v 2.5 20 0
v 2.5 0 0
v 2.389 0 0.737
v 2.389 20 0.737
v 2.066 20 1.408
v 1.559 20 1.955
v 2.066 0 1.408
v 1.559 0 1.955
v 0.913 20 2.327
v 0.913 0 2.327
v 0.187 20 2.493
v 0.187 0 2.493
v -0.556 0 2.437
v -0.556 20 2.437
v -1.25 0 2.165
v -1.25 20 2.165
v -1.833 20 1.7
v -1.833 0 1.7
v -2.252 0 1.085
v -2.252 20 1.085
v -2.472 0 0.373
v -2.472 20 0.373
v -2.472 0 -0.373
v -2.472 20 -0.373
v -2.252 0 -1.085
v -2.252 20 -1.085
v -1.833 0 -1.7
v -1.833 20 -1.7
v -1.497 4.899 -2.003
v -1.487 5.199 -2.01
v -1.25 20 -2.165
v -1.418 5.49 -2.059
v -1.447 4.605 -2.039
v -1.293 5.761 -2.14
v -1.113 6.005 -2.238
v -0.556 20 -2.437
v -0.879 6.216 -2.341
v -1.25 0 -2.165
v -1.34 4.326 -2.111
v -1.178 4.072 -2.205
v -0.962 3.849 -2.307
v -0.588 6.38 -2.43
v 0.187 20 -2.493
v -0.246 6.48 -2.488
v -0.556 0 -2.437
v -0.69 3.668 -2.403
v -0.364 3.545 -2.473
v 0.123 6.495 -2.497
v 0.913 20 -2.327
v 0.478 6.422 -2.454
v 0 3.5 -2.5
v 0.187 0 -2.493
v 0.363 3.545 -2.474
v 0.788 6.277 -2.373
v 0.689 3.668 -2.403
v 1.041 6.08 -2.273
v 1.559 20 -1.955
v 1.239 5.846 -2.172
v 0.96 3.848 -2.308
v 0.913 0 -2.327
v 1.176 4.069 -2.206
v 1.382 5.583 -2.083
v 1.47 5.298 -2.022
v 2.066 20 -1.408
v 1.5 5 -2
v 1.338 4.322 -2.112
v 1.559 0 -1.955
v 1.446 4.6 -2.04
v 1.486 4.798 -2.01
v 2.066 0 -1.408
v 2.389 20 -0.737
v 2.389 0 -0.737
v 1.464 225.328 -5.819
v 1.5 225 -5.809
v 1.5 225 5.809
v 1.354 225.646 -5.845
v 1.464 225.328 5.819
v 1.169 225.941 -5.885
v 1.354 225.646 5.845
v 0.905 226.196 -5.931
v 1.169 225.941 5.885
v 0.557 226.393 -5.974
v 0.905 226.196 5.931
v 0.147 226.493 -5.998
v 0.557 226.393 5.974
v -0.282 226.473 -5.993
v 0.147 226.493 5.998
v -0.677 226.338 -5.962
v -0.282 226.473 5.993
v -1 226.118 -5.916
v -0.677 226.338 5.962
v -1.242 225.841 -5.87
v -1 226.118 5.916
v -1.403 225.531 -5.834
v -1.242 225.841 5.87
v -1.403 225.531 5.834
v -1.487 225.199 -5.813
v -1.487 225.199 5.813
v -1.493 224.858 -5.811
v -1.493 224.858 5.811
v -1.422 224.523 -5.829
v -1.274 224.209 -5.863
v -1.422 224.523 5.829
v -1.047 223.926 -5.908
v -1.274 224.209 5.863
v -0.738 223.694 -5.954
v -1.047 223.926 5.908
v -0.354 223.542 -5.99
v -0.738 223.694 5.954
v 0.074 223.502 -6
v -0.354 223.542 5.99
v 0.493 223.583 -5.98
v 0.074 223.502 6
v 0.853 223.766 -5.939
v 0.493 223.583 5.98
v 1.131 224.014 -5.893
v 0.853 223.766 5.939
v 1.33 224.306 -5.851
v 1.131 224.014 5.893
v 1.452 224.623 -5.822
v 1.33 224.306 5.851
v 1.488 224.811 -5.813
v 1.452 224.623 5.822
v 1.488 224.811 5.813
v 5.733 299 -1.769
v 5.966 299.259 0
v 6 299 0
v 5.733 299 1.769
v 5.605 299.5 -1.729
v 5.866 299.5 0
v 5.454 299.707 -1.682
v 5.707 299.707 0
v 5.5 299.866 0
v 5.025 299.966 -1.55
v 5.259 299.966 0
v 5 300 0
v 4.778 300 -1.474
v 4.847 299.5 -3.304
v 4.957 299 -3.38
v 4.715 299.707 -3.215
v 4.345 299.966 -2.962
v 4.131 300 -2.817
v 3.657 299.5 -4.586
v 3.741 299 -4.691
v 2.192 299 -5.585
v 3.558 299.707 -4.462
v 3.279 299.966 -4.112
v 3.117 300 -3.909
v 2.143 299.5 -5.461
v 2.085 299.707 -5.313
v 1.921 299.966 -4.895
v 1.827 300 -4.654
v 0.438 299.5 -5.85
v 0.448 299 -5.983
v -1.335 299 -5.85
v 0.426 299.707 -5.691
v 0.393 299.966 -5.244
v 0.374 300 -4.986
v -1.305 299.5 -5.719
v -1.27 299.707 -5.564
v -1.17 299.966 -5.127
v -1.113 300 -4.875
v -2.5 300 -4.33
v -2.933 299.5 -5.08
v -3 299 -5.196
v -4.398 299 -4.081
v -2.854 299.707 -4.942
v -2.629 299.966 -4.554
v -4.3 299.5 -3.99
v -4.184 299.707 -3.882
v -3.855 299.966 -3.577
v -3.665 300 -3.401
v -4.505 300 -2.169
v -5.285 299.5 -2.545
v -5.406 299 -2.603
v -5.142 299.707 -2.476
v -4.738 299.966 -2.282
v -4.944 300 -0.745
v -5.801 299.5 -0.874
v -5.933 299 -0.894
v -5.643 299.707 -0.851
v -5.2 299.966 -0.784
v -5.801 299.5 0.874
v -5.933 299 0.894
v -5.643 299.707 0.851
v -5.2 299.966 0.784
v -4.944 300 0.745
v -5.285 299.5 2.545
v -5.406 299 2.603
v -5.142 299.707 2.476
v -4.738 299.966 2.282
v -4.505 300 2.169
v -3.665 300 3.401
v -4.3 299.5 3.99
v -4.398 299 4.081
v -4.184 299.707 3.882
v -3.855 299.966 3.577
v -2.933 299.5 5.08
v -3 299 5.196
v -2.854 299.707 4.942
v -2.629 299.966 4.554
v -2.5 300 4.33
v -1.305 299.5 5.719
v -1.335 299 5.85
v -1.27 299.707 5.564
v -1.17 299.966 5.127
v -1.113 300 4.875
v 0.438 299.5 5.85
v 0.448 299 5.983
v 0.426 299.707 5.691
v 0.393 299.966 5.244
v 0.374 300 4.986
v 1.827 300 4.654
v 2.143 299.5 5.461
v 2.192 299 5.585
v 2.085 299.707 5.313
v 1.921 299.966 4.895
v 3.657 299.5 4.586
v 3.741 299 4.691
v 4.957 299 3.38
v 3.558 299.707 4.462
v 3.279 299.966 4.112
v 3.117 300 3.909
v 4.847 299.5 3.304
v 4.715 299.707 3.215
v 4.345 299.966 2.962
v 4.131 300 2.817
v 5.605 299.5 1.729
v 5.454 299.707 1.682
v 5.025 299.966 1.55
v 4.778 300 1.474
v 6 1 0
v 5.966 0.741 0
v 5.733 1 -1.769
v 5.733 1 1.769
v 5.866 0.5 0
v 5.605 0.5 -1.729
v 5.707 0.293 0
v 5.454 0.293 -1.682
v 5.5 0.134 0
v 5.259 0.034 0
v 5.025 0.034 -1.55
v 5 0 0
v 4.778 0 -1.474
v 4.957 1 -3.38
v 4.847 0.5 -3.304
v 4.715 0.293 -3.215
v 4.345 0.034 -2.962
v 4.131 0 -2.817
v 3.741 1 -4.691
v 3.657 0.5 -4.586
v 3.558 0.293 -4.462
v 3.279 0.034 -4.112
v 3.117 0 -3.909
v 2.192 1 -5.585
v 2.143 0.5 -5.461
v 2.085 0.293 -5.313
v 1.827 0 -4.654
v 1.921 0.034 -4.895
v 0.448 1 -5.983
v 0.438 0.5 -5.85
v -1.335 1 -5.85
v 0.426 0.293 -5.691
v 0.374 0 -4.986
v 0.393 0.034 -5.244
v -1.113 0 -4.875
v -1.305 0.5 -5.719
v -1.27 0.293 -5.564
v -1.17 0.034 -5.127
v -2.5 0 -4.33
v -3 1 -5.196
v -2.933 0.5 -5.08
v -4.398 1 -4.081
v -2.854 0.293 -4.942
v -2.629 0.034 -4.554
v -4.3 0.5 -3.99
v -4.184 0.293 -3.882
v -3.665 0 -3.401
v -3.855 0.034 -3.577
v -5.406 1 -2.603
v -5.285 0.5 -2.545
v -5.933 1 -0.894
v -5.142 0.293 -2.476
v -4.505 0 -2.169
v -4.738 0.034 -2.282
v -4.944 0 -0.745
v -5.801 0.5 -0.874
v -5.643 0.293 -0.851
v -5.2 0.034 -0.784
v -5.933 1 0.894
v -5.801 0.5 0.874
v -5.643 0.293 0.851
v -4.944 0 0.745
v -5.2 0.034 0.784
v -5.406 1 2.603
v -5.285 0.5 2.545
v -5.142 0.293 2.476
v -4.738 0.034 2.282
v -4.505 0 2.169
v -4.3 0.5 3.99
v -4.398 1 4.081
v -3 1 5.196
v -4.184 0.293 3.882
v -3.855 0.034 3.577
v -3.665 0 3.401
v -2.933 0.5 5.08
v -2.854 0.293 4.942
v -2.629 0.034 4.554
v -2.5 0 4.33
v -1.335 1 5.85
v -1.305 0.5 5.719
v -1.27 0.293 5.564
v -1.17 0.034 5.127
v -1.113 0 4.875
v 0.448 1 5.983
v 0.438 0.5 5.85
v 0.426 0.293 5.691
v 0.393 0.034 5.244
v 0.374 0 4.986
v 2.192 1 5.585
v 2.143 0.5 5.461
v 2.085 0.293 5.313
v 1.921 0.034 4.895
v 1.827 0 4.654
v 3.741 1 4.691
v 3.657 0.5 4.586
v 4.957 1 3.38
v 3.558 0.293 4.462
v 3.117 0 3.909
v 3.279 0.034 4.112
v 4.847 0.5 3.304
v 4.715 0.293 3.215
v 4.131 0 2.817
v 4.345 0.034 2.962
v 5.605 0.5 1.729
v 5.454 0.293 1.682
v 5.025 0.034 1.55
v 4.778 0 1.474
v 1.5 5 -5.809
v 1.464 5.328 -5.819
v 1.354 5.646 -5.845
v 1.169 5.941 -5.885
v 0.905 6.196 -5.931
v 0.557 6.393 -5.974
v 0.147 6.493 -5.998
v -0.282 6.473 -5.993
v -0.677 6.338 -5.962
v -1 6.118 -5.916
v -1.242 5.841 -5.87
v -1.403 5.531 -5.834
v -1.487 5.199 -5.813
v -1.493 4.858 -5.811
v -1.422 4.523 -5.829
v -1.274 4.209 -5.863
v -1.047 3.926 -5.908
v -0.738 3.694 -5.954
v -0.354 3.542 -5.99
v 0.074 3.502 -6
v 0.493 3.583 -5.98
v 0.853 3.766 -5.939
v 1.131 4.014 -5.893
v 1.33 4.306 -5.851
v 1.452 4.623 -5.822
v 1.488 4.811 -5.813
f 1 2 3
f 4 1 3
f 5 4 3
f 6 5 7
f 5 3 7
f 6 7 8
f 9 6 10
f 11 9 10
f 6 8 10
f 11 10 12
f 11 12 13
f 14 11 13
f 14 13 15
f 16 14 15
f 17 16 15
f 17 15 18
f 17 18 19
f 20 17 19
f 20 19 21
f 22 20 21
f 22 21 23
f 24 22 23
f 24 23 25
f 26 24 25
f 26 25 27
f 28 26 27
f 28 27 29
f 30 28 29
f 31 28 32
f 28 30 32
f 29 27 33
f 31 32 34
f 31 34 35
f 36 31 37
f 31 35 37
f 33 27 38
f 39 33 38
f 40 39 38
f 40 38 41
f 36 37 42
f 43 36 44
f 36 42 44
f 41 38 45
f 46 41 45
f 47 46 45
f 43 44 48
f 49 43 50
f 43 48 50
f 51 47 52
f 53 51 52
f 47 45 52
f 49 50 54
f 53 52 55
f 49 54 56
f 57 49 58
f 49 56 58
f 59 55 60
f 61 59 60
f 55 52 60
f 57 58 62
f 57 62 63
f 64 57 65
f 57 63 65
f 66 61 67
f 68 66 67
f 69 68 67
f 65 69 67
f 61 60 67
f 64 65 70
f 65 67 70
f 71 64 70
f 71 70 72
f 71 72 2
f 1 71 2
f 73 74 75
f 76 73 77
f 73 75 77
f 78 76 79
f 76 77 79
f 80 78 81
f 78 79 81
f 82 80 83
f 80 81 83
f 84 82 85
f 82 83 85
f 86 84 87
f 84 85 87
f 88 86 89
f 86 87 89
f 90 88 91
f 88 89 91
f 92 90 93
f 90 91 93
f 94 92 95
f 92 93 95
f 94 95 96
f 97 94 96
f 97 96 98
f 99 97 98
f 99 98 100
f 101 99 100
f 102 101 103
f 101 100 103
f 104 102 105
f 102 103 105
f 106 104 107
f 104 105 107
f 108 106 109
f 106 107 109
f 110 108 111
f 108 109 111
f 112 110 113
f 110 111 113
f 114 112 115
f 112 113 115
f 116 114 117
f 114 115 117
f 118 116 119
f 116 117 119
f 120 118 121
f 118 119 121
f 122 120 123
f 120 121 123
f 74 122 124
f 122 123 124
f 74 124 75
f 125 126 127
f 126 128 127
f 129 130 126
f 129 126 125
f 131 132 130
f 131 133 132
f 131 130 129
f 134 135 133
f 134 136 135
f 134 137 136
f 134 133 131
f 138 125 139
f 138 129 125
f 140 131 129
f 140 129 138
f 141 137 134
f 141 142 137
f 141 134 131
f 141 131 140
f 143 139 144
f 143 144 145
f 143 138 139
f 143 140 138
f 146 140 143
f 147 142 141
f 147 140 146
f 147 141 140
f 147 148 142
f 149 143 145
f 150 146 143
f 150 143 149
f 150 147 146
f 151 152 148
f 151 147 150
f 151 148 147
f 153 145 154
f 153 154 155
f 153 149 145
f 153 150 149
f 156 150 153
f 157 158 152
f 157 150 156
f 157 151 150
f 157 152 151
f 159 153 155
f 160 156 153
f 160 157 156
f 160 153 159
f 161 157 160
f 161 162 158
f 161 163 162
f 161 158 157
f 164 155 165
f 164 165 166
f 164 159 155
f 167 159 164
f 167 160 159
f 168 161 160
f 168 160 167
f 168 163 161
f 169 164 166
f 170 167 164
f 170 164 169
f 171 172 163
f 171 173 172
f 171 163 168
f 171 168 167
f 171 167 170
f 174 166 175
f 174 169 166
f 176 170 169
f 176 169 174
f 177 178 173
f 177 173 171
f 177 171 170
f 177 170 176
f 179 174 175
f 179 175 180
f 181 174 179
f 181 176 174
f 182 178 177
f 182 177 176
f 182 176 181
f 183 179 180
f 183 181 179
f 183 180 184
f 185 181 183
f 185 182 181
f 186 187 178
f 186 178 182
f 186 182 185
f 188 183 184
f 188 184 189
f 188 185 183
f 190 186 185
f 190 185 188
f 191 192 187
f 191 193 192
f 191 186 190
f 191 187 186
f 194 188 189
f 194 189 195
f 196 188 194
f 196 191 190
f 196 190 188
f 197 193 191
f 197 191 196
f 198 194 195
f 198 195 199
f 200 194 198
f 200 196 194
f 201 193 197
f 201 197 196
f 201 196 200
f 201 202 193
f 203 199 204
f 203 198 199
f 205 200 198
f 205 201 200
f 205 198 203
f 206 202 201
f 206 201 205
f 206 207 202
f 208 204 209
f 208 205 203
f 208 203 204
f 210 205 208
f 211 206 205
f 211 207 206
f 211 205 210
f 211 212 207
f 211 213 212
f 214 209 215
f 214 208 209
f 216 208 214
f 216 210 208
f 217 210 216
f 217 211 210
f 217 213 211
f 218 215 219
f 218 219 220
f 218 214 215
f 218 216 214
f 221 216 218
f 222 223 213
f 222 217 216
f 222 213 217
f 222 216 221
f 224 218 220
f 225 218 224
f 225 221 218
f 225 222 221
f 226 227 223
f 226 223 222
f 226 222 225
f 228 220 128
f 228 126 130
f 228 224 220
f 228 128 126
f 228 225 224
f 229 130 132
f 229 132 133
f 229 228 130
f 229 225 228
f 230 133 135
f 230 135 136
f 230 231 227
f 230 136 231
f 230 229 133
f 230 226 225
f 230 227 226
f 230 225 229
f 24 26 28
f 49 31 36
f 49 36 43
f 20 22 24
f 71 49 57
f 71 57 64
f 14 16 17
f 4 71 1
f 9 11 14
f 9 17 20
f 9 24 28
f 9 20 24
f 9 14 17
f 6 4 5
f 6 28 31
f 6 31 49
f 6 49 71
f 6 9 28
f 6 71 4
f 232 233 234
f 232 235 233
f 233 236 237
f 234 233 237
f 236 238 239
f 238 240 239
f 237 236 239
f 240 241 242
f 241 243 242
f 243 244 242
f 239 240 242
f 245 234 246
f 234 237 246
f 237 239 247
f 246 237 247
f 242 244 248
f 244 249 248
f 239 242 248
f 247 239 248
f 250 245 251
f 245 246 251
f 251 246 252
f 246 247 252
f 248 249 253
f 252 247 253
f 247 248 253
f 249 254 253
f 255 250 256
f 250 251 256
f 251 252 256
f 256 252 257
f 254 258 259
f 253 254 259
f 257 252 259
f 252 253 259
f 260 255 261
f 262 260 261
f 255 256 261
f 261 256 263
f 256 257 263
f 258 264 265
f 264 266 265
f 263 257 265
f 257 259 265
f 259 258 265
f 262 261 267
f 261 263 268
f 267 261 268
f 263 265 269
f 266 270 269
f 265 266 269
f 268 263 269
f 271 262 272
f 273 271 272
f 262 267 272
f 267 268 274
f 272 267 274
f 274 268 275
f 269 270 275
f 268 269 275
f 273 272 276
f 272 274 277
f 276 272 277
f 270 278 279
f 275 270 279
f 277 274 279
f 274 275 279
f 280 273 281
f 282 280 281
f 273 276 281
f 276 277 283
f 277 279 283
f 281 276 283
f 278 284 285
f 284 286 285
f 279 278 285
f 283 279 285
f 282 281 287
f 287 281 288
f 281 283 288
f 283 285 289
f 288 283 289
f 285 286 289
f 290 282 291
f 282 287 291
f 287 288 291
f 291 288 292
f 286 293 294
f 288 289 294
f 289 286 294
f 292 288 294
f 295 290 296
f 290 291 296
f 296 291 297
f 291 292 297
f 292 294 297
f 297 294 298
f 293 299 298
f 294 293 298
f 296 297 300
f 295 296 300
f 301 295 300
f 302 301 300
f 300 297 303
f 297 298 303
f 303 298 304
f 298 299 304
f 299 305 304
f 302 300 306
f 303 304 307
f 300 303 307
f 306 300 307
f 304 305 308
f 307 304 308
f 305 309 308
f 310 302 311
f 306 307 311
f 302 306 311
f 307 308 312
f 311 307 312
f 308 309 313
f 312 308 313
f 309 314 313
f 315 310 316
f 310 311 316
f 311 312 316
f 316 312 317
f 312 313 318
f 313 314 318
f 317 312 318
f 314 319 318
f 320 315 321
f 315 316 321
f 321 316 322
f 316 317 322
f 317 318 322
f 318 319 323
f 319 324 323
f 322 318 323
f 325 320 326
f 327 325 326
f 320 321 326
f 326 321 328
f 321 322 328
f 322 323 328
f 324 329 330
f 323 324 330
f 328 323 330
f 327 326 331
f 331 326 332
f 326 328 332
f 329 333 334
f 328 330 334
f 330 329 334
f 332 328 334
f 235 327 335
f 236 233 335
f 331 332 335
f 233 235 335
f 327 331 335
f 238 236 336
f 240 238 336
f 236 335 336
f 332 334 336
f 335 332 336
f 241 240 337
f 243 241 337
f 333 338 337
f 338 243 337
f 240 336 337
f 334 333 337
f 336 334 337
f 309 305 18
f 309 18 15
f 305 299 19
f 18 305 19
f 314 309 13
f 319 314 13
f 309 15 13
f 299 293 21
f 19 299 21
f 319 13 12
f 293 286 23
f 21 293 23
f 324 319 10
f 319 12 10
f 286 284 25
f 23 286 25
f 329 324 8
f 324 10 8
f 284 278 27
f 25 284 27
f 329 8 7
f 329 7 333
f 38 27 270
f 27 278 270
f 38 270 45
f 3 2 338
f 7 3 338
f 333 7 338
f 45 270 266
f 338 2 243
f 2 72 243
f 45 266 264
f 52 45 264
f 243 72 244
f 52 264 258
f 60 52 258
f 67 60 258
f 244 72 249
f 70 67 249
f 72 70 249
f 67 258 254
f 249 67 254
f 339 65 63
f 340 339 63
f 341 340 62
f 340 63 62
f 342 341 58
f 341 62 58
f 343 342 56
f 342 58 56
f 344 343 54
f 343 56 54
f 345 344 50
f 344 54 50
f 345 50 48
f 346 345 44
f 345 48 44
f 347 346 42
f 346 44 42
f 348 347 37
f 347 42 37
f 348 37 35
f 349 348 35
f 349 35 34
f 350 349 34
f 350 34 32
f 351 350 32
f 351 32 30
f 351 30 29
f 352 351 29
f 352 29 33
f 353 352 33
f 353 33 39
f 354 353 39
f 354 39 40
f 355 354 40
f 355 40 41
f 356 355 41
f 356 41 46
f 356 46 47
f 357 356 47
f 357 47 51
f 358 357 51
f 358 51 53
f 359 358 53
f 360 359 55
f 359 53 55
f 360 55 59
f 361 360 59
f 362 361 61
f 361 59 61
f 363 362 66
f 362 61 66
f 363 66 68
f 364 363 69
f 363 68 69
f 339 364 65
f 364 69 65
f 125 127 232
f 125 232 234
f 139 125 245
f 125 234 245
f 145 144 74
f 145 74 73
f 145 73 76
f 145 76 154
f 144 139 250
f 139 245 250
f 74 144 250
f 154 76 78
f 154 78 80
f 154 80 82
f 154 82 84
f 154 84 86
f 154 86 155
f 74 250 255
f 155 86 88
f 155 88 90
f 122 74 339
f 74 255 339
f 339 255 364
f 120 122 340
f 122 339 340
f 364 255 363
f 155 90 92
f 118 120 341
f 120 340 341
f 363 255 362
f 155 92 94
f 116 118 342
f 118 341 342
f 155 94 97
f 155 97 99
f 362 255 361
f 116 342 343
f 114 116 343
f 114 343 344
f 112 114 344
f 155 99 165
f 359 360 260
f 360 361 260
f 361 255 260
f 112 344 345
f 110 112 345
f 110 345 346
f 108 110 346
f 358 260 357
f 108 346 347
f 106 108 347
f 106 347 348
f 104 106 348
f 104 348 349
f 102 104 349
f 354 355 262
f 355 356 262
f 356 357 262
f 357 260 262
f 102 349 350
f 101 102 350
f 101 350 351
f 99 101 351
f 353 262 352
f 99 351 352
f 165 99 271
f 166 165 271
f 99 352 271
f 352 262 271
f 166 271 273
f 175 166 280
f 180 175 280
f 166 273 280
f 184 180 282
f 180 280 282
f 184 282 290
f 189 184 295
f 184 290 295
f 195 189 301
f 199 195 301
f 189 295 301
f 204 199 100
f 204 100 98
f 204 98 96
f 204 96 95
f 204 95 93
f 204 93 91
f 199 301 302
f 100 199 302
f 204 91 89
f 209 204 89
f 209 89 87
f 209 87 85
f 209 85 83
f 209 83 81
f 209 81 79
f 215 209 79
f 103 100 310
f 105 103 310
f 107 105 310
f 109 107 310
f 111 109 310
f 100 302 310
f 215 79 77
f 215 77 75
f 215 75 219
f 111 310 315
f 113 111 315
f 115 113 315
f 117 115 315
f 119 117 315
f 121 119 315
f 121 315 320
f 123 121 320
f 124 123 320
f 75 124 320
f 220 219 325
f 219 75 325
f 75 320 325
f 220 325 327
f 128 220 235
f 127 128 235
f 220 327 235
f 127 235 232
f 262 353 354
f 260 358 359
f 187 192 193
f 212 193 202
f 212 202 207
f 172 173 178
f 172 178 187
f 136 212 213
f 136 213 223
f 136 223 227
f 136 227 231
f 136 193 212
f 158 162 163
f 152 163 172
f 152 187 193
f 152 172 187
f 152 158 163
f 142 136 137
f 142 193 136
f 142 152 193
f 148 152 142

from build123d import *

# Parameters (mm, degrees)
SKETCH1_R               = 6
BOSS_EXTRUDE1_DEPTH     = 300
SKETCH2_R               = 2.5
CUT_EXTRUDE1_DEPTH      = 20
SKETCH3_R               = 1.5
CUT_EXTRUDE2_DEPTH      = 20
FILLET1_R               = 1
SKETCH4_R               = 1.5
CUT_EXTRUDE3_DEPTH      = 7.0000001
CUT_EXTRUDE3_DEPTH_BACK = 7.000000127


with BuildPart() as part:
    # Sketch1 → Boss-Extrude1 (new body)
    with BuildSketch(Plane(origin=(0, 0, 0), x_dir=(1, 0, 0), z_dir=(0, 1, 0))):
        Circle(SKETCH1_R)
    extrude(amount=BOSS_EXTRUDE1_DEPTH)

    # Sketch2 → Cut-Extrude1 (cut)
    with BuildSketch(Plane.XZ):
        Circle(SKETCH2_R)
    extrude(amount=-CUT_EXTRUDE1_DEPTH, mode=Mode.SUBTRACT)

    # Sketch3 → Cut-Extrude2 (cut)
    with BuildSketch(Plane.XY):
        with Locations((0, 5)):
            Circle(SKETCH3_R)
    extrude(amount=-CUT_EXTRUDE2_DEPTH, mode=Mode.SUBTRACT)

    # Fillet1
    fillet1_edges = [part.edges().sort_by_distance(p)[0] for p in [
        (-6, 0, 0),
        (-6, 300, 0),
    ]]
    fillet(fillet1_edges, radius=FILLET1_R)

    # Sketch4 → Cut-Extrude3 (cut, two sides)
    with BuildSketch(Plane.XY) as cut_extrude3_sk:
        with Locations((0, 225)):
            Circle(SKETCH4_R)
    extrude(amount=CUT_EXTRUDE3_DEPTH, mode=Mode.SUBTRACT)
    extrude(cut_extrude3_sk.sketch, amount=-CUT_EXTRUDE3_DEPTH_BACK, mode=Mode.SUBTRACT)


solid = part.part
